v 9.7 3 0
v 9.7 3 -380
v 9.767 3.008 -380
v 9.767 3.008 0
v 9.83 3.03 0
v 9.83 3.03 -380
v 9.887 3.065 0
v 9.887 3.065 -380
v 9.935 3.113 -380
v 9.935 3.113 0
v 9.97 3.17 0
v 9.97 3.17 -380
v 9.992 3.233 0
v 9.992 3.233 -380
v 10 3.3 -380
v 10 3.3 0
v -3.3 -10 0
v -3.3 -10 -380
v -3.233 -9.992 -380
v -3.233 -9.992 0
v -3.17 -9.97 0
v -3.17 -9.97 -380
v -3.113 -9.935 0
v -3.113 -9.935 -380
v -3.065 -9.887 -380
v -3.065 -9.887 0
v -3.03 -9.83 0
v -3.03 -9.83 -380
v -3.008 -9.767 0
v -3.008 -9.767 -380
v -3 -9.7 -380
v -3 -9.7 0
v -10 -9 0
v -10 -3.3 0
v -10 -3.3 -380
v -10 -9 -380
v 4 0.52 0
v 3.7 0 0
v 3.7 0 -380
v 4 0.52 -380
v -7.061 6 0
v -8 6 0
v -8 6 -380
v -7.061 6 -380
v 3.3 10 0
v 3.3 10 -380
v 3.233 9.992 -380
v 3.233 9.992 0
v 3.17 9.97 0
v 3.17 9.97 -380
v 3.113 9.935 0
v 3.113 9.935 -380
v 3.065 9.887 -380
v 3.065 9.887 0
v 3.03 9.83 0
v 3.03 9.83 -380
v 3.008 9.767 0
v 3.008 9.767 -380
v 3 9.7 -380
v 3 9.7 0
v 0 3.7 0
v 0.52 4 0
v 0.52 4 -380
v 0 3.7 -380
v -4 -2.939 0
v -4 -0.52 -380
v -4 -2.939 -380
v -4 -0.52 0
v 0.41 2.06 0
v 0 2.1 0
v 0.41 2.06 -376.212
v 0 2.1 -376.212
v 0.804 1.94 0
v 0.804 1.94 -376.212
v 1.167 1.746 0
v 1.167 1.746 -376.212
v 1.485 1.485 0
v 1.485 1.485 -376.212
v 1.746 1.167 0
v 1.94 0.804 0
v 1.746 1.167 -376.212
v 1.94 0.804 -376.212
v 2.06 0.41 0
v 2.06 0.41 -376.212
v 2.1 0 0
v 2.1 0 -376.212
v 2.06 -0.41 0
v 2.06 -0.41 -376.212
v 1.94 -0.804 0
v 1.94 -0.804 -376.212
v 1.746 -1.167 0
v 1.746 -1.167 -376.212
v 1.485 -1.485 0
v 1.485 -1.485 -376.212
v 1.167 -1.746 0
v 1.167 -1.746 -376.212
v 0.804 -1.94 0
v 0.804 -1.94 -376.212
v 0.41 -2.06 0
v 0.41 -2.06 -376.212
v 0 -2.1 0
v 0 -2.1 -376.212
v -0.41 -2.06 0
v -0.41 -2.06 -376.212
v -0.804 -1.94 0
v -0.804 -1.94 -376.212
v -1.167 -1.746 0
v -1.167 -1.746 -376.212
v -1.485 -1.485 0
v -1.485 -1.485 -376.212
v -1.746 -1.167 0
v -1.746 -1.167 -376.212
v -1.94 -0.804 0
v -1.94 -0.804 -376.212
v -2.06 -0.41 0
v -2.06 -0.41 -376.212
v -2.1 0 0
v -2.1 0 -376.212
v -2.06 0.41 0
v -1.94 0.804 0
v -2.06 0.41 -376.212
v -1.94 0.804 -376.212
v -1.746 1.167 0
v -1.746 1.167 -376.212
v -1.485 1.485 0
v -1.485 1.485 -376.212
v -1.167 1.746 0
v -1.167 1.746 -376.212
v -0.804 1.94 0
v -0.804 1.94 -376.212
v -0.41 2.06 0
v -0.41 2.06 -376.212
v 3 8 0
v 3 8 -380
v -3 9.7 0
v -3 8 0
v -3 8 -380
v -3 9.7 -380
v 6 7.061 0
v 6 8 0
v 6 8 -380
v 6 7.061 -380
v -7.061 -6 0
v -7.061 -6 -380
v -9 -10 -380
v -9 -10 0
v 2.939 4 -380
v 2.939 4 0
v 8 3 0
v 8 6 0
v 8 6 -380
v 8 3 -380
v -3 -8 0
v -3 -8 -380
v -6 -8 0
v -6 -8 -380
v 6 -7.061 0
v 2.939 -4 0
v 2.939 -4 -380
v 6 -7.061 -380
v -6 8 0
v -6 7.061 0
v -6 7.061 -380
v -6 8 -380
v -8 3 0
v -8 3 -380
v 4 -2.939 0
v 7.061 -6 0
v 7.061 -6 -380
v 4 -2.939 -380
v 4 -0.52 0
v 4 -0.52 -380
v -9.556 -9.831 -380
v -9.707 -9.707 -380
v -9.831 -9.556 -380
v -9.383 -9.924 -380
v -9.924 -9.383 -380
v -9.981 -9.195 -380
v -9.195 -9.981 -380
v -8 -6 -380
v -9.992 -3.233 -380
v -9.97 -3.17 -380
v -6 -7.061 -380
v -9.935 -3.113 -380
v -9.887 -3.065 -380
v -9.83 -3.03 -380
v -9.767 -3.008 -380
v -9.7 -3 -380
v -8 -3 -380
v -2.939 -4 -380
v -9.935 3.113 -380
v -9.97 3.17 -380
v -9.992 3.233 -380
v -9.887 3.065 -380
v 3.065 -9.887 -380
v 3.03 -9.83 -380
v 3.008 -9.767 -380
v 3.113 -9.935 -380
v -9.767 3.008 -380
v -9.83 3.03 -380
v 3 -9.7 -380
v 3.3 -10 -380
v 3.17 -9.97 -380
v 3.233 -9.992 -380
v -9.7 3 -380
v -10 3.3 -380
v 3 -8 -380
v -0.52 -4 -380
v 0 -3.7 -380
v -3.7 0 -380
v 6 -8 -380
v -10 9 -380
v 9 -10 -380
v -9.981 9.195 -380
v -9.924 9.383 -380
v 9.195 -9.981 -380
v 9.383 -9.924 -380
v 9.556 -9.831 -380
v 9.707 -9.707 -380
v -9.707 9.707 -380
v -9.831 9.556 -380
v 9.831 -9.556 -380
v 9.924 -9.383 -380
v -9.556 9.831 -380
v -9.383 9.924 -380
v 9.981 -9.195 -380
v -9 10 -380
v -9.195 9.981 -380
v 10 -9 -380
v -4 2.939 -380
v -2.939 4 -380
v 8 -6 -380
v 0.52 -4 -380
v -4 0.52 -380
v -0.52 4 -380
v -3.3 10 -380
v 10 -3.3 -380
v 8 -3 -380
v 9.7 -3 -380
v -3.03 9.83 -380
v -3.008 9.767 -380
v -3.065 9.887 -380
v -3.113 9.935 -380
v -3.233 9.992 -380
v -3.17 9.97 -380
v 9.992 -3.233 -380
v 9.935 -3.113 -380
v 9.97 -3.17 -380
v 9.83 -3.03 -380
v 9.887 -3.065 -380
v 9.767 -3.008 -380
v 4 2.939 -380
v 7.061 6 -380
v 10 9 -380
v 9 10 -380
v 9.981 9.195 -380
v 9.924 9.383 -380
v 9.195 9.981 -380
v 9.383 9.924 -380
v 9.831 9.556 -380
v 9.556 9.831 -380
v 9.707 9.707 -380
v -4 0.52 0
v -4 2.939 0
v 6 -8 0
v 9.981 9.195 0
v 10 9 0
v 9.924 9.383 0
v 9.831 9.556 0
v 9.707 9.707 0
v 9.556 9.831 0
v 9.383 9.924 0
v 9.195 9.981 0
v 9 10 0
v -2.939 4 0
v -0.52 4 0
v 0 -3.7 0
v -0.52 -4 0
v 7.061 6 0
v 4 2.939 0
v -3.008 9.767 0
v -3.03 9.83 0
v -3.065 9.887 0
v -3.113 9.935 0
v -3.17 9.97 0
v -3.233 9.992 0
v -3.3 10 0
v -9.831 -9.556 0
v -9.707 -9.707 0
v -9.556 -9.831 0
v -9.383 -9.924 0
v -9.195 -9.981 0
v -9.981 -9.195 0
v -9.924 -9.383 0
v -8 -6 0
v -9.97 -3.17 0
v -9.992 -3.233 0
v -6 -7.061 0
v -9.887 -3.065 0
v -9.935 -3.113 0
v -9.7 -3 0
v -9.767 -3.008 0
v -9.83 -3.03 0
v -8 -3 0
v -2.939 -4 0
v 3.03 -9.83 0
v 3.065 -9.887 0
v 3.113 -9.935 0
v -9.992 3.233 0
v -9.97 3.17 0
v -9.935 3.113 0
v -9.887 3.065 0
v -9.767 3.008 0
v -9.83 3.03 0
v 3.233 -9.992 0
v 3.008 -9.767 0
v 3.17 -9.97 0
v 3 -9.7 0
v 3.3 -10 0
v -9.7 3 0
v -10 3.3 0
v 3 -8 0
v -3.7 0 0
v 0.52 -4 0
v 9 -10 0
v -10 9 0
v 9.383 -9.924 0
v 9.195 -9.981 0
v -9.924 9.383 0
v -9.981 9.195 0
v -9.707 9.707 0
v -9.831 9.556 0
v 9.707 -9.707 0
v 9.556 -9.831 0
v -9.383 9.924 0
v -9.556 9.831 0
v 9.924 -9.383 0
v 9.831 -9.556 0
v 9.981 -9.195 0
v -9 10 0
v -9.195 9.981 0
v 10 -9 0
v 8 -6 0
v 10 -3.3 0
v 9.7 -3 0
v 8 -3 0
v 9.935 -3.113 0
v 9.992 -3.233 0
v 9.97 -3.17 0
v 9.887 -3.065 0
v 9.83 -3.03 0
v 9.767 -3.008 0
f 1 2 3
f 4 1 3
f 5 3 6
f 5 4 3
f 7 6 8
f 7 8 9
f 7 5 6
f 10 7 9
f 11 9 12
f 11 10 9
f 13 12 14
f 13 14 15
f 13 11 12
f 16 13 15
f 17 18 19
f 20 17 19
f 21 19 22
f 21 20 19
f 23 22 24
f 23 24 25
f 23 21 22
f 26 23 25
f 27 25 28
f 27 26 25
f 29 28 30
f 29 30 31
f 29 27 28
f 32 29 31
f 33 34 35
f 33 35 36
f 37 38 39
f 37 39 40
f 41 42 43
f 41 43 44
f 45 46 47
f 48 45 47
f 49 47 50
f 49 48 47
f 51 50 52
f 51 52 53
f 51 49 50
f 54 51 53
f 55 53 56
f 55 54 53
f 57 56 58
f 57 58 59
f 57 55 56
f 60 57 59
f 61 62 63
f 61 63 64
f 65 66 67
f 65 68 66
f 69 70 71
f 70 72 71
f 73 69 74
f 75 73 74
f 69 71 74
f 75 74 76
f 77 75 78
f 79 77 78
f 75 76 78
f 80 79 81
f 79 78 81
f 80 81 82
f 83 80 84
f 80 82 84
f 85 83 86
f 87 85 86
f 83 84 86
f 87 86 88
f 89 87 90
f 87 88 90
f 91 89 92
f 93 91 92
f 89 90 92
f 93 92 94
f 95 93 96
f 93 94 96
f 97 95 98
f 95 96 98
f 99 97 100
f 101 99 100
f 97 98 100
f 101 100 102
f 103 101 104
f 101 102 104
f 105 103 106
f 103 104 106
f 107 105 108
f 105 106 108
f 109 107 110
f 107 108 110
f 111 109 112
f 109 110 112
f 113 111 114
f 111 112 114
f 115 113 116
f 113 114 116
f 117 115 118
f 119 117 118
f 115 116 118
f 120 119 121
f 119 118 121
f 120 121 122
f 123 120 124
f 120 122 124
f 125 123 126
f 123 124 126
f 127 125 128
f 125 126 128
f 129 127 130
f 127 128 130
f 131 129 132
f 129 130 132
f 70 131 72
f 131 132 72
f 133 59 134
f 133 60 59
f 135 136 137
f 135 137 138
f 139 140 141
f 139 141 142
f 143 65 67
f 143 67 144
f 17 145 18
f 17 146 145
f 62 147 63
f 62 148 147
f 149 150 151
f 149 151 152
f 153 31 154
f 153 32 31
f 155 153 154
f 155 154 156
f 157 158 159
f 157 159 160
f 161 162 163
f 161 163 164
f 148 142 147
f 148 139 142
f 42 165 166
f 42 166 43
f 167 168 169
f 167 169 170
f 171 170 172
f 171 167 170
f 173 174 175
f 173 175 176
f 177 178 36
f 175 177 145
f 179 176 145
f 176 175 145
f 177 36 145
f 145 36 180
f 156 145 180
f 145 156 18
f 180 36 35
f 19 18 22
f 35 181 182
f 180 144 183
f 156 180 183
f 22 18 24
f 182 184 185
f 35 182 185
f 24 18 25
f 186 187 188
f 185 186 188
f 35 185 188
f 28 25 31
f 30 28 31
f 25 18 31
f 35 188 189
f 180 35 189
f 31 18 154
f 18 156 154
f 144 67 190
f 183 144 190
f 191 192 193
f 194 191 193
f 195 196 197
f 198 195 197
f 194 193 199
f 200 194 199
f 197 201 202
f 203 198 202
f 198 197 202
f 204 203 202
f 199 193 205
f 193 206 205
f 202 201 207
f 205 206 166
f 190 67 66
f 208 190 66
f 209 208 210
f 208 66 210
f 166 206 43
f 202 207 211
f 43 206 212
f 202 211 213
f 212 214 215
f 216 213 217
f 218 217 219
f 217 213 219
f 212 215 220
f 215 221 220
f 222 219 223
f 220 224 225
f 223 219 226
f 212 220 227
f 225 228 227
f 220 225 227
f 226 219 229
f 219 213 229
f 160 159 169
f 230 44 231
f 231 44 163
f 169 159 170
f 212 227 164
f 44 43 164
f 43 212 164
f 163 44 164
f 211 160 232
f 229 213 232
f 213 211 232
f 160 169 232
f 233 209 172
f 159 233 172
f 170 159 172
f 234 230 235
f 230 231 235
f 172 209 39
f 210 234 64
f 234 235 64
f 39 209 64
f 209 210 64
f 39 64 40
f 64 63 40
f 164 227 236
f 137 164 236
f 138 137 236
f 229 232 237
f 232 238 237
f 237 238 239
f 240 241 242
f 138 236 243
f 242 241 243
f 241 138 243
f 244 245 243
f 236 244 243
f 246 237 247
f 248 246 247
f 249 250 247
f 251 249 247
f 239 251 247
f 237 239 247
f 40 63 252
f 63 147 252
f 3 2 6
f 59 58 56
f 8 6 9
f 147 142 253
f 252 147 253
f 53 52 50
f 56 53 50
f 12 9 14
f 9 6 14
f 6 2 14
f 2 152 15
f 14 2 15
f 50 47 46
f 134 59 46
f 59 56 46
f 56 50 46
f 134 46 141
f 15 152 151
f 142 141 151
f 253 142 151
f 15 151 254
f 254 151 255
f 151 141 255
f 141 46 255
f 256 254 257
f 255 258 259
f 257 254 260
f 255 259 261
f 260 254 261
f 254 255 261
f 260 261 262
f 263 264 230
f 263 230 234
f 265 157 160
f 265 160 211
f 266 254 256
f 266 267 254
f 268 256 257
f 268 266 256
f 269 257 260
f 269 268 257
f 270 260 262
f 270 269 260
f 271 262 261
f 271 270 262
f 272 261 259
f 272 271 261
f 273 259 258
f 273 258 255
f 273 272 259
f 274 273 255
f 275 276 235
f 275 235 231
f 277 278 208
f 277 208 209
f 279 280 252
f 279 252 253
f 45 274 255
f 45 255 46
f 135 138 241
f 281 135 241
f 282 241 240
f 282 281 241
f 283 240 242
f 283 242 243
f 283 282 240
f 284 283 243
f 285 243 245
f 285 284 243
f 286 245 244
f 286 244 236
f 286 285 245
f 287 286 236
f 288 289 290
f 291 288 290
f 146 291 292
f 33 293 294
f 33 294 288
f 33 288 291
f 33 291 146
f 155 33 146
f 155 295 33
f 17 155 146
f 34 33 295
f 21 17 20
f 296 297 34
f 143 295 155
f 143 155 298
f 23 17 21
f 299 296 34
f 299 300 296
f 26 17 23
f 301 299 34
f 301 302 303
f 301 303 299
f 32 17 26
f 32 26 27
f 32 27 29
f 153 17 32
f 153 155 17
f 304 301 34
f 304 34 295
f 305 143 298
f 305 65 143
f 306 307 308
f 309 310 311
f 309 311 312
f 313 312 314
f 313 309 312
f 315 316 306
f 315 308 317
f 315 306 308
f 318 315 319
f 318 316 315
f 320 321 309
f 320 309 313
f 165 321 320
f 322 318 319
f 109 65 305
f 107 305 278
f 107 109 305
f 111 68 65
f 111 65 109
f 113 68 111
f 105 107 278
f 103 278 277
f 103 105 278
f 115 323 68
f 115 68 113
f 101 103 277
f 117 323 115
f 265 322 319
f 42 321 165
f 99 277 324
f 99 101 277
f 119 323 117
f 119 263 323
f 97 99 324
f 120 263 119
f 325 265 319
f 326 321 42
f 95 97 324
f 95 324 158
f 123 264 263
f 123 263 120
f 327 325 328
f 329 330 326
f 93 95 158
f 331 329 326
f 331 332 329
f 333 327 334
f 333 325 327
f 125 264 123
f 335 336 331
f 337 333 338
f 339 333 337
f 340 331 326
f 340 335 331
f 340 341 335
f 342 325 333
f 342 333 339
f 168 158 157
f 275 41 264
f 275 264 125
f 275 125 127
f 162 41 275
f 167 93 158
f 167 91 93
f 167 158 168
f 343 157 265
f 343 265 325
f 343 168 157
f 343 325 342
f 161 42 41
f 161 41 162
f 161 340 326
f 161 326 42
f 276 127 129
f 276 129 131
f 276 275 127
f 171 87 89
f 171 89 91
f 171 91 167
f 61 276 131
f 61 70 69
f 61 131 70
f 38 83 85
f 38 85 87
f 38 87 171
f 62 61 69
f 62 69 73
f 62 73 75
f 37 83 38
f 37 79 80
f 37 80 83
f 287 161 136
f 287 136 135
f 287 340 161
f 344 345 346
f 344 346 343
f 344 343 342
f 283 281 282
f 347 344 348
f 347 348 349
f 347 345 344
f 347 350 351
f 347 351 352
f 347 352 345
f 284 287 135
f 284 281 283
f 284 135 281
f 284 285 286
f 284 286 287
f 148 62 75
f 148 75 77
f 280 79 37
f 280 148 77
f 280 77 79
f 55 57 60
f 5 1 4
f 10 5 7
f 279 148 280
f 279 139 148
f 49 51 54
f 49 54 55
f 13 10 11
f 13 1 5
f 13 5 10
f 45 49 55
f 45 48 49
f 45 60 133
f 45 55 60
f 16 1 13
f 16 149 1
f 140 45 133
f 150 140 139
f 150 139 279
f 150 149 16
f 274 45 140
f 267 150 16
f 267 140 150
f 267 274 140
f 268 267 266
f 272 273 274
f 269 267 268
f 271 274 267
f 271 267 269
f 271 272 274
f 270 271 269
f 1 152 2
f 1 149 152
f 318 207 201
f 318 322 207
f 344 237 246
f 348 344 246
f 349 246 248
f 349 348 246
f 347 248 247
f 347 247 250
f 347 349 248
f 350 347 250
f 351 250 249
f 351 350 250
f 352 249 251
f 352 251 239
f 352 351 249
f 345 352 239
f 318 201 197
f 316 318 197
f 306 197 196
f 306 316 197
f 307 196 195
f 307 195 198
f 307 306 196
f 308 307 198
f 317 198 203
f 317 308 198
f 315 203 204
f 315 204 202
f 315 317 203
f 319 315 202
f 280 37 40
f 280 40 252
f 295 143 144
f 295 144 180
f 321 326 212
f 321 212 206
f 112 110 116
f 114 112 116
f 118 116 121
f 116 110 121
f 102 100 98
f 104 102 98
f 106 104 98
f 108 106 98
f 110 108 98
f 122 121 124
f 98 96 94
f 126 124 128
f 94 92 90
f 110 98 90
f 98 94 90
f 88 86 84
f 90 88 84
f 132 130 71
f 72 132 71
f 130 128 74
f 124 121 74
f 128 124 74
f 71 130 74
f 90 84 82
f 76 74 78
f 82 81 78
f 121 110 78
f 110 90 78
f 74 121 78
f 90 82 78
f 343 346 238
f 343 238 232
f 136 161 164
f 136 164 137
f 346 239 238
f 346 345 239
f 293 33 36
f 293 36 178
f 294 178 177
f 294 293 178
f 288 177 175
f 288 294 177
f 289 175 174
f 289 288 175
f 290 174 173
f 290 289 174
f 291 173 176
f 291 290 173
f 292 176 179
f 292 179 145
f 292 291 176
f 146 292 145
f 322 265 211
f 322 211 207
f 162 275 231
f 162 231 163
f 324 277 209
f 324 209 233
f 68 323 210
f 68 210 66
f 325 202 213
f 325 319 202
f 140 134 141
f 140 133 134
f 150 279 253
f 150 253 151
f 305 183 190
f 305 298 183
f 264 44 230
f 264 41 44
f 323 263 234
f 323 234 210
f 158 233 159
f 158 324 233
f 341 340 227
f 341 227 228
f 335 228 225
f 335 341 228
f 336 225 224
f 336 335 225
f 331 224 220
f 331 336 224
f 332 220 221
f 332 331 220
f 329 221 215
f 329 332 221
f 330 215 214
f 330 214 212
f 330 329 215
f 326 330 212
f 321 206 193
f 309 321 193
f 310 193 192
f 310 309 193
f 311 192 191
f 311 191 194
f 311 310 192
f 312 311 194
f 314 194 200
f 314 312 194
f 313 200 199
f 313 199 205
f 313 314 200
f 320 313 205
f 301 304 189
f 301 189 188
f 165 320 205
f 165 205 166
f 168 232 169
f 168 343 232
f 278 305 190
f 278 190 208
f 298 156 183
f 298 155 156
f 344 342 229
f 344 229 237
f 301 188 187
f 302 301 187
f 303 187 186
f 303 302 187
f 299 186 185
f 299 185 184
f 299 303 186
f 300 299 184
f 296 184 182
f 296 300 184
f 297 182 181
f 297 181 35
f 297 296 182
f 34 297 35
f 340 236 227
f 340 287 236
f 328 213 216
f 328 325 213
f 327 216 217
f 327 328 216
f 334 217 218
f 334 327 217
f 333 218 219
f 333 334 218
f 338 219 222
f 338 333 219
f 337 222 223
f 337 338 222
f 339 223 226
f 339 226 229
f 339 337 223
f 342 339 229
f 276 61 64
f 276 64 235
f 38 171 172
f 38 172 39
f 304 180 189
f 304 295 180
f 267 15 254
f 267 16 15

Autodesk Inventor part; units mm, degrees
sketch "Sketch_1" plane through (0, 0, 0) normal (0, 0, 1) x (1, 0, 0)
  line L0 (-10, 9) -> (-10, 3.3)
  arc A0 (-10, 3.3) -> (-9.7, 3) centre (-9.7, 3.3) ccw
  line L1 (-9.7, 3) -> (-8, 3)
  line L2 (-8, 3) -> (-8, 6)
  line L3 (-8, 6) -> (-7.0607, 6)
  line L4 (-7.0607, 6) -> (-4, 2.9393)
  line L5 (-4, 2.9393) -> (-4, 0.5196)
  line L6 (-4, 0.5196) -> (-3.7, 0)
  line L7 (-3.7, 0) -> (-4, -0.5196)
  line L8 (-4, -0.5196) -> (-4, -2.9393)
  line L9 (-4, -2.9393) -> (-7.0607, -6)
  line L10 (-7.0607, -6) -> (-8, -6)
  line L11 (-8, -6) -> (-8, -3)
  line L12 (-8, -3) -> (-9.7, -3)
  arc A1 (-9.7, -3) -> (-10, -3.3) centre (-9.7, -3.3) ccw
  line L13 (-10, -3.3) -> (-10, -9)
  arc A2 (-10, -9) -> (-9, -10) centre (-9, -9) ccw
  line L14 (-9, -10) -> (-3.3, -10)
  arc A3 (-3.3, -10) -> (-3, -9.7) centre (-3.3, -9.7) ccw
  line L15 (-3, -9.7) -> (-3, -8)
  line L16 (-3, -8) -> (-6, -8)
  line L17 (-6, -8) -> (-6, -7.0607)
  line L18 (-6, -7.0607) -> (-2.9393, -4)
  line L19 (-2.9393, -4) -> (-0.5196, -4)
  line L20 (-0.5196, -4) -> (0, -3.7)
  line L21 (0, -3.7) -> (0.5196, -4)
  line L22 (0.5196, -4) -> (2.9393, -4)
  line L23 (2.9393, -4) -> (6, -7.0607)
  line L24 (6, -7.0607) -> (6, -8)
  line L25 (6, -8) -> (3, -8)
  line L26 (3, -8) -> (3, -9.7)
  arc A4 (3, -9.7) -> (3.3, -10) centre (3.3, -9.7) ccw
  line L27 (3.3, -10) -> (9, -10)
  arc A5 (9, -10) -> (10, -9) centre (9, -9) ccw
  line L28 (10, -9) -> (10, -3.3)
  arc A6 (10, -3.3) -> (9.7, -3) centre (9.7, -3.3) ccw
  line L29 (9.7, -3) -> (8, -3)
  line L30 (8, -3) -> (8, -6)
  line L31 (8, -6) -> (7.0606, -6)
  line L32 (7.0606, -6) -> (4, -2.9393)
  line L33 (4, -2.9393) -> (4, -0.5196)
  line L34 (4, -0.5196) -> (3.7, 0)
  line L35 (3.7, 0) -> (4, 0.5196)
  line L36 (4, 0.5196) -> (4, 2.9393)
  line L37 (4, 2.9393) -> (7.0607, 6)
  line L38 (7.0607, 6) -> (8, 6)
  line L39 (8, 6) -> (8, 3)
  line L40 (8, 3) -> (9.7, 3)
  arc A7 (9.7, 3) -> (10, 3.3) centre (9.7, 3.3) ccw
  line L41 (10, 3.3) -> (10, 9)
  arc A8 (10, 9) -> (9, 10) centre (9, 9) ccw
  line L42 (9, 10) -> (3.3, 10)
  arc A9 (3.3, 10) -> (3, 9.7) centre (3.3, 9.7) ccw
  line L43 (3, 9.7) -> (3, 8)
  line L44 (3, 8) -> (6, 8)
  line L45 (6, 8) -> (6, 7.0607)
  line L46 (6, 7.0607) -> (2.9393, 4)
  line L47 (2.9393, 4) -> (0.5196, 4)
  line L48 (0.5196, 4) -> (0, 3.7)
  line L49 (0, 3.7) -> (-0.5196, 4)
  line L50 (-0.5196, 4) -> (-2.9394, 4)
  line L51 (-2.9394, 4) -> (-6, 7.0606)
  line L52 (-6, 7.0606) -> (-6, 8)
  line L53 (-6, 8) -> (-3, 8)
  line L54 (-3, 8) -> (-3, 9.7)
  arc A10 (-3, 9.7) -> (-3.3, 10) centre (-3.3, 9.7) ccw
  line L55 (-3.3, 10) -> (-9, 10)
  arc A11 (-9, 10) -> (-10, 9) centre (-9, 9) ccw
extrude "Extrusion1" add sketch "Sketch_1" against normal blind 380
sketch "Sketch_2" plane through (0, 0, 0) normal (1, 0, 0) x (0, 0, -1)
  line L0 (300, 0) -> (0, 0)
  line L1 (0, 0) -> (0, 2.1)
  line L2 (0, 2.1) -> (376.2125, 2.1)
  line L3 (376.2125, 2.1) -> (376.2125, 0)
  line L4 (376.2125, 0) -> (0, 0)
revolve "Revolution1" cut sketch "Sketch_2" angle 360 about axis through (0, 0, -300) along (0, 0, -1)
ref_plane "C1_XY" through (0, 0, 0) normal (0, 0, 1) x (1, 0, 0)
ref_plane "C1_YZ" through (0, 0, 0) normal (1, 0, 0) x (0, 1, 0)
ref_plane "C1_ZX" through (0, 0, 0) normal (0, 1, 0) x (0, 0, 1)
properties part number "FrameSide" material "Aluminum 6061"
